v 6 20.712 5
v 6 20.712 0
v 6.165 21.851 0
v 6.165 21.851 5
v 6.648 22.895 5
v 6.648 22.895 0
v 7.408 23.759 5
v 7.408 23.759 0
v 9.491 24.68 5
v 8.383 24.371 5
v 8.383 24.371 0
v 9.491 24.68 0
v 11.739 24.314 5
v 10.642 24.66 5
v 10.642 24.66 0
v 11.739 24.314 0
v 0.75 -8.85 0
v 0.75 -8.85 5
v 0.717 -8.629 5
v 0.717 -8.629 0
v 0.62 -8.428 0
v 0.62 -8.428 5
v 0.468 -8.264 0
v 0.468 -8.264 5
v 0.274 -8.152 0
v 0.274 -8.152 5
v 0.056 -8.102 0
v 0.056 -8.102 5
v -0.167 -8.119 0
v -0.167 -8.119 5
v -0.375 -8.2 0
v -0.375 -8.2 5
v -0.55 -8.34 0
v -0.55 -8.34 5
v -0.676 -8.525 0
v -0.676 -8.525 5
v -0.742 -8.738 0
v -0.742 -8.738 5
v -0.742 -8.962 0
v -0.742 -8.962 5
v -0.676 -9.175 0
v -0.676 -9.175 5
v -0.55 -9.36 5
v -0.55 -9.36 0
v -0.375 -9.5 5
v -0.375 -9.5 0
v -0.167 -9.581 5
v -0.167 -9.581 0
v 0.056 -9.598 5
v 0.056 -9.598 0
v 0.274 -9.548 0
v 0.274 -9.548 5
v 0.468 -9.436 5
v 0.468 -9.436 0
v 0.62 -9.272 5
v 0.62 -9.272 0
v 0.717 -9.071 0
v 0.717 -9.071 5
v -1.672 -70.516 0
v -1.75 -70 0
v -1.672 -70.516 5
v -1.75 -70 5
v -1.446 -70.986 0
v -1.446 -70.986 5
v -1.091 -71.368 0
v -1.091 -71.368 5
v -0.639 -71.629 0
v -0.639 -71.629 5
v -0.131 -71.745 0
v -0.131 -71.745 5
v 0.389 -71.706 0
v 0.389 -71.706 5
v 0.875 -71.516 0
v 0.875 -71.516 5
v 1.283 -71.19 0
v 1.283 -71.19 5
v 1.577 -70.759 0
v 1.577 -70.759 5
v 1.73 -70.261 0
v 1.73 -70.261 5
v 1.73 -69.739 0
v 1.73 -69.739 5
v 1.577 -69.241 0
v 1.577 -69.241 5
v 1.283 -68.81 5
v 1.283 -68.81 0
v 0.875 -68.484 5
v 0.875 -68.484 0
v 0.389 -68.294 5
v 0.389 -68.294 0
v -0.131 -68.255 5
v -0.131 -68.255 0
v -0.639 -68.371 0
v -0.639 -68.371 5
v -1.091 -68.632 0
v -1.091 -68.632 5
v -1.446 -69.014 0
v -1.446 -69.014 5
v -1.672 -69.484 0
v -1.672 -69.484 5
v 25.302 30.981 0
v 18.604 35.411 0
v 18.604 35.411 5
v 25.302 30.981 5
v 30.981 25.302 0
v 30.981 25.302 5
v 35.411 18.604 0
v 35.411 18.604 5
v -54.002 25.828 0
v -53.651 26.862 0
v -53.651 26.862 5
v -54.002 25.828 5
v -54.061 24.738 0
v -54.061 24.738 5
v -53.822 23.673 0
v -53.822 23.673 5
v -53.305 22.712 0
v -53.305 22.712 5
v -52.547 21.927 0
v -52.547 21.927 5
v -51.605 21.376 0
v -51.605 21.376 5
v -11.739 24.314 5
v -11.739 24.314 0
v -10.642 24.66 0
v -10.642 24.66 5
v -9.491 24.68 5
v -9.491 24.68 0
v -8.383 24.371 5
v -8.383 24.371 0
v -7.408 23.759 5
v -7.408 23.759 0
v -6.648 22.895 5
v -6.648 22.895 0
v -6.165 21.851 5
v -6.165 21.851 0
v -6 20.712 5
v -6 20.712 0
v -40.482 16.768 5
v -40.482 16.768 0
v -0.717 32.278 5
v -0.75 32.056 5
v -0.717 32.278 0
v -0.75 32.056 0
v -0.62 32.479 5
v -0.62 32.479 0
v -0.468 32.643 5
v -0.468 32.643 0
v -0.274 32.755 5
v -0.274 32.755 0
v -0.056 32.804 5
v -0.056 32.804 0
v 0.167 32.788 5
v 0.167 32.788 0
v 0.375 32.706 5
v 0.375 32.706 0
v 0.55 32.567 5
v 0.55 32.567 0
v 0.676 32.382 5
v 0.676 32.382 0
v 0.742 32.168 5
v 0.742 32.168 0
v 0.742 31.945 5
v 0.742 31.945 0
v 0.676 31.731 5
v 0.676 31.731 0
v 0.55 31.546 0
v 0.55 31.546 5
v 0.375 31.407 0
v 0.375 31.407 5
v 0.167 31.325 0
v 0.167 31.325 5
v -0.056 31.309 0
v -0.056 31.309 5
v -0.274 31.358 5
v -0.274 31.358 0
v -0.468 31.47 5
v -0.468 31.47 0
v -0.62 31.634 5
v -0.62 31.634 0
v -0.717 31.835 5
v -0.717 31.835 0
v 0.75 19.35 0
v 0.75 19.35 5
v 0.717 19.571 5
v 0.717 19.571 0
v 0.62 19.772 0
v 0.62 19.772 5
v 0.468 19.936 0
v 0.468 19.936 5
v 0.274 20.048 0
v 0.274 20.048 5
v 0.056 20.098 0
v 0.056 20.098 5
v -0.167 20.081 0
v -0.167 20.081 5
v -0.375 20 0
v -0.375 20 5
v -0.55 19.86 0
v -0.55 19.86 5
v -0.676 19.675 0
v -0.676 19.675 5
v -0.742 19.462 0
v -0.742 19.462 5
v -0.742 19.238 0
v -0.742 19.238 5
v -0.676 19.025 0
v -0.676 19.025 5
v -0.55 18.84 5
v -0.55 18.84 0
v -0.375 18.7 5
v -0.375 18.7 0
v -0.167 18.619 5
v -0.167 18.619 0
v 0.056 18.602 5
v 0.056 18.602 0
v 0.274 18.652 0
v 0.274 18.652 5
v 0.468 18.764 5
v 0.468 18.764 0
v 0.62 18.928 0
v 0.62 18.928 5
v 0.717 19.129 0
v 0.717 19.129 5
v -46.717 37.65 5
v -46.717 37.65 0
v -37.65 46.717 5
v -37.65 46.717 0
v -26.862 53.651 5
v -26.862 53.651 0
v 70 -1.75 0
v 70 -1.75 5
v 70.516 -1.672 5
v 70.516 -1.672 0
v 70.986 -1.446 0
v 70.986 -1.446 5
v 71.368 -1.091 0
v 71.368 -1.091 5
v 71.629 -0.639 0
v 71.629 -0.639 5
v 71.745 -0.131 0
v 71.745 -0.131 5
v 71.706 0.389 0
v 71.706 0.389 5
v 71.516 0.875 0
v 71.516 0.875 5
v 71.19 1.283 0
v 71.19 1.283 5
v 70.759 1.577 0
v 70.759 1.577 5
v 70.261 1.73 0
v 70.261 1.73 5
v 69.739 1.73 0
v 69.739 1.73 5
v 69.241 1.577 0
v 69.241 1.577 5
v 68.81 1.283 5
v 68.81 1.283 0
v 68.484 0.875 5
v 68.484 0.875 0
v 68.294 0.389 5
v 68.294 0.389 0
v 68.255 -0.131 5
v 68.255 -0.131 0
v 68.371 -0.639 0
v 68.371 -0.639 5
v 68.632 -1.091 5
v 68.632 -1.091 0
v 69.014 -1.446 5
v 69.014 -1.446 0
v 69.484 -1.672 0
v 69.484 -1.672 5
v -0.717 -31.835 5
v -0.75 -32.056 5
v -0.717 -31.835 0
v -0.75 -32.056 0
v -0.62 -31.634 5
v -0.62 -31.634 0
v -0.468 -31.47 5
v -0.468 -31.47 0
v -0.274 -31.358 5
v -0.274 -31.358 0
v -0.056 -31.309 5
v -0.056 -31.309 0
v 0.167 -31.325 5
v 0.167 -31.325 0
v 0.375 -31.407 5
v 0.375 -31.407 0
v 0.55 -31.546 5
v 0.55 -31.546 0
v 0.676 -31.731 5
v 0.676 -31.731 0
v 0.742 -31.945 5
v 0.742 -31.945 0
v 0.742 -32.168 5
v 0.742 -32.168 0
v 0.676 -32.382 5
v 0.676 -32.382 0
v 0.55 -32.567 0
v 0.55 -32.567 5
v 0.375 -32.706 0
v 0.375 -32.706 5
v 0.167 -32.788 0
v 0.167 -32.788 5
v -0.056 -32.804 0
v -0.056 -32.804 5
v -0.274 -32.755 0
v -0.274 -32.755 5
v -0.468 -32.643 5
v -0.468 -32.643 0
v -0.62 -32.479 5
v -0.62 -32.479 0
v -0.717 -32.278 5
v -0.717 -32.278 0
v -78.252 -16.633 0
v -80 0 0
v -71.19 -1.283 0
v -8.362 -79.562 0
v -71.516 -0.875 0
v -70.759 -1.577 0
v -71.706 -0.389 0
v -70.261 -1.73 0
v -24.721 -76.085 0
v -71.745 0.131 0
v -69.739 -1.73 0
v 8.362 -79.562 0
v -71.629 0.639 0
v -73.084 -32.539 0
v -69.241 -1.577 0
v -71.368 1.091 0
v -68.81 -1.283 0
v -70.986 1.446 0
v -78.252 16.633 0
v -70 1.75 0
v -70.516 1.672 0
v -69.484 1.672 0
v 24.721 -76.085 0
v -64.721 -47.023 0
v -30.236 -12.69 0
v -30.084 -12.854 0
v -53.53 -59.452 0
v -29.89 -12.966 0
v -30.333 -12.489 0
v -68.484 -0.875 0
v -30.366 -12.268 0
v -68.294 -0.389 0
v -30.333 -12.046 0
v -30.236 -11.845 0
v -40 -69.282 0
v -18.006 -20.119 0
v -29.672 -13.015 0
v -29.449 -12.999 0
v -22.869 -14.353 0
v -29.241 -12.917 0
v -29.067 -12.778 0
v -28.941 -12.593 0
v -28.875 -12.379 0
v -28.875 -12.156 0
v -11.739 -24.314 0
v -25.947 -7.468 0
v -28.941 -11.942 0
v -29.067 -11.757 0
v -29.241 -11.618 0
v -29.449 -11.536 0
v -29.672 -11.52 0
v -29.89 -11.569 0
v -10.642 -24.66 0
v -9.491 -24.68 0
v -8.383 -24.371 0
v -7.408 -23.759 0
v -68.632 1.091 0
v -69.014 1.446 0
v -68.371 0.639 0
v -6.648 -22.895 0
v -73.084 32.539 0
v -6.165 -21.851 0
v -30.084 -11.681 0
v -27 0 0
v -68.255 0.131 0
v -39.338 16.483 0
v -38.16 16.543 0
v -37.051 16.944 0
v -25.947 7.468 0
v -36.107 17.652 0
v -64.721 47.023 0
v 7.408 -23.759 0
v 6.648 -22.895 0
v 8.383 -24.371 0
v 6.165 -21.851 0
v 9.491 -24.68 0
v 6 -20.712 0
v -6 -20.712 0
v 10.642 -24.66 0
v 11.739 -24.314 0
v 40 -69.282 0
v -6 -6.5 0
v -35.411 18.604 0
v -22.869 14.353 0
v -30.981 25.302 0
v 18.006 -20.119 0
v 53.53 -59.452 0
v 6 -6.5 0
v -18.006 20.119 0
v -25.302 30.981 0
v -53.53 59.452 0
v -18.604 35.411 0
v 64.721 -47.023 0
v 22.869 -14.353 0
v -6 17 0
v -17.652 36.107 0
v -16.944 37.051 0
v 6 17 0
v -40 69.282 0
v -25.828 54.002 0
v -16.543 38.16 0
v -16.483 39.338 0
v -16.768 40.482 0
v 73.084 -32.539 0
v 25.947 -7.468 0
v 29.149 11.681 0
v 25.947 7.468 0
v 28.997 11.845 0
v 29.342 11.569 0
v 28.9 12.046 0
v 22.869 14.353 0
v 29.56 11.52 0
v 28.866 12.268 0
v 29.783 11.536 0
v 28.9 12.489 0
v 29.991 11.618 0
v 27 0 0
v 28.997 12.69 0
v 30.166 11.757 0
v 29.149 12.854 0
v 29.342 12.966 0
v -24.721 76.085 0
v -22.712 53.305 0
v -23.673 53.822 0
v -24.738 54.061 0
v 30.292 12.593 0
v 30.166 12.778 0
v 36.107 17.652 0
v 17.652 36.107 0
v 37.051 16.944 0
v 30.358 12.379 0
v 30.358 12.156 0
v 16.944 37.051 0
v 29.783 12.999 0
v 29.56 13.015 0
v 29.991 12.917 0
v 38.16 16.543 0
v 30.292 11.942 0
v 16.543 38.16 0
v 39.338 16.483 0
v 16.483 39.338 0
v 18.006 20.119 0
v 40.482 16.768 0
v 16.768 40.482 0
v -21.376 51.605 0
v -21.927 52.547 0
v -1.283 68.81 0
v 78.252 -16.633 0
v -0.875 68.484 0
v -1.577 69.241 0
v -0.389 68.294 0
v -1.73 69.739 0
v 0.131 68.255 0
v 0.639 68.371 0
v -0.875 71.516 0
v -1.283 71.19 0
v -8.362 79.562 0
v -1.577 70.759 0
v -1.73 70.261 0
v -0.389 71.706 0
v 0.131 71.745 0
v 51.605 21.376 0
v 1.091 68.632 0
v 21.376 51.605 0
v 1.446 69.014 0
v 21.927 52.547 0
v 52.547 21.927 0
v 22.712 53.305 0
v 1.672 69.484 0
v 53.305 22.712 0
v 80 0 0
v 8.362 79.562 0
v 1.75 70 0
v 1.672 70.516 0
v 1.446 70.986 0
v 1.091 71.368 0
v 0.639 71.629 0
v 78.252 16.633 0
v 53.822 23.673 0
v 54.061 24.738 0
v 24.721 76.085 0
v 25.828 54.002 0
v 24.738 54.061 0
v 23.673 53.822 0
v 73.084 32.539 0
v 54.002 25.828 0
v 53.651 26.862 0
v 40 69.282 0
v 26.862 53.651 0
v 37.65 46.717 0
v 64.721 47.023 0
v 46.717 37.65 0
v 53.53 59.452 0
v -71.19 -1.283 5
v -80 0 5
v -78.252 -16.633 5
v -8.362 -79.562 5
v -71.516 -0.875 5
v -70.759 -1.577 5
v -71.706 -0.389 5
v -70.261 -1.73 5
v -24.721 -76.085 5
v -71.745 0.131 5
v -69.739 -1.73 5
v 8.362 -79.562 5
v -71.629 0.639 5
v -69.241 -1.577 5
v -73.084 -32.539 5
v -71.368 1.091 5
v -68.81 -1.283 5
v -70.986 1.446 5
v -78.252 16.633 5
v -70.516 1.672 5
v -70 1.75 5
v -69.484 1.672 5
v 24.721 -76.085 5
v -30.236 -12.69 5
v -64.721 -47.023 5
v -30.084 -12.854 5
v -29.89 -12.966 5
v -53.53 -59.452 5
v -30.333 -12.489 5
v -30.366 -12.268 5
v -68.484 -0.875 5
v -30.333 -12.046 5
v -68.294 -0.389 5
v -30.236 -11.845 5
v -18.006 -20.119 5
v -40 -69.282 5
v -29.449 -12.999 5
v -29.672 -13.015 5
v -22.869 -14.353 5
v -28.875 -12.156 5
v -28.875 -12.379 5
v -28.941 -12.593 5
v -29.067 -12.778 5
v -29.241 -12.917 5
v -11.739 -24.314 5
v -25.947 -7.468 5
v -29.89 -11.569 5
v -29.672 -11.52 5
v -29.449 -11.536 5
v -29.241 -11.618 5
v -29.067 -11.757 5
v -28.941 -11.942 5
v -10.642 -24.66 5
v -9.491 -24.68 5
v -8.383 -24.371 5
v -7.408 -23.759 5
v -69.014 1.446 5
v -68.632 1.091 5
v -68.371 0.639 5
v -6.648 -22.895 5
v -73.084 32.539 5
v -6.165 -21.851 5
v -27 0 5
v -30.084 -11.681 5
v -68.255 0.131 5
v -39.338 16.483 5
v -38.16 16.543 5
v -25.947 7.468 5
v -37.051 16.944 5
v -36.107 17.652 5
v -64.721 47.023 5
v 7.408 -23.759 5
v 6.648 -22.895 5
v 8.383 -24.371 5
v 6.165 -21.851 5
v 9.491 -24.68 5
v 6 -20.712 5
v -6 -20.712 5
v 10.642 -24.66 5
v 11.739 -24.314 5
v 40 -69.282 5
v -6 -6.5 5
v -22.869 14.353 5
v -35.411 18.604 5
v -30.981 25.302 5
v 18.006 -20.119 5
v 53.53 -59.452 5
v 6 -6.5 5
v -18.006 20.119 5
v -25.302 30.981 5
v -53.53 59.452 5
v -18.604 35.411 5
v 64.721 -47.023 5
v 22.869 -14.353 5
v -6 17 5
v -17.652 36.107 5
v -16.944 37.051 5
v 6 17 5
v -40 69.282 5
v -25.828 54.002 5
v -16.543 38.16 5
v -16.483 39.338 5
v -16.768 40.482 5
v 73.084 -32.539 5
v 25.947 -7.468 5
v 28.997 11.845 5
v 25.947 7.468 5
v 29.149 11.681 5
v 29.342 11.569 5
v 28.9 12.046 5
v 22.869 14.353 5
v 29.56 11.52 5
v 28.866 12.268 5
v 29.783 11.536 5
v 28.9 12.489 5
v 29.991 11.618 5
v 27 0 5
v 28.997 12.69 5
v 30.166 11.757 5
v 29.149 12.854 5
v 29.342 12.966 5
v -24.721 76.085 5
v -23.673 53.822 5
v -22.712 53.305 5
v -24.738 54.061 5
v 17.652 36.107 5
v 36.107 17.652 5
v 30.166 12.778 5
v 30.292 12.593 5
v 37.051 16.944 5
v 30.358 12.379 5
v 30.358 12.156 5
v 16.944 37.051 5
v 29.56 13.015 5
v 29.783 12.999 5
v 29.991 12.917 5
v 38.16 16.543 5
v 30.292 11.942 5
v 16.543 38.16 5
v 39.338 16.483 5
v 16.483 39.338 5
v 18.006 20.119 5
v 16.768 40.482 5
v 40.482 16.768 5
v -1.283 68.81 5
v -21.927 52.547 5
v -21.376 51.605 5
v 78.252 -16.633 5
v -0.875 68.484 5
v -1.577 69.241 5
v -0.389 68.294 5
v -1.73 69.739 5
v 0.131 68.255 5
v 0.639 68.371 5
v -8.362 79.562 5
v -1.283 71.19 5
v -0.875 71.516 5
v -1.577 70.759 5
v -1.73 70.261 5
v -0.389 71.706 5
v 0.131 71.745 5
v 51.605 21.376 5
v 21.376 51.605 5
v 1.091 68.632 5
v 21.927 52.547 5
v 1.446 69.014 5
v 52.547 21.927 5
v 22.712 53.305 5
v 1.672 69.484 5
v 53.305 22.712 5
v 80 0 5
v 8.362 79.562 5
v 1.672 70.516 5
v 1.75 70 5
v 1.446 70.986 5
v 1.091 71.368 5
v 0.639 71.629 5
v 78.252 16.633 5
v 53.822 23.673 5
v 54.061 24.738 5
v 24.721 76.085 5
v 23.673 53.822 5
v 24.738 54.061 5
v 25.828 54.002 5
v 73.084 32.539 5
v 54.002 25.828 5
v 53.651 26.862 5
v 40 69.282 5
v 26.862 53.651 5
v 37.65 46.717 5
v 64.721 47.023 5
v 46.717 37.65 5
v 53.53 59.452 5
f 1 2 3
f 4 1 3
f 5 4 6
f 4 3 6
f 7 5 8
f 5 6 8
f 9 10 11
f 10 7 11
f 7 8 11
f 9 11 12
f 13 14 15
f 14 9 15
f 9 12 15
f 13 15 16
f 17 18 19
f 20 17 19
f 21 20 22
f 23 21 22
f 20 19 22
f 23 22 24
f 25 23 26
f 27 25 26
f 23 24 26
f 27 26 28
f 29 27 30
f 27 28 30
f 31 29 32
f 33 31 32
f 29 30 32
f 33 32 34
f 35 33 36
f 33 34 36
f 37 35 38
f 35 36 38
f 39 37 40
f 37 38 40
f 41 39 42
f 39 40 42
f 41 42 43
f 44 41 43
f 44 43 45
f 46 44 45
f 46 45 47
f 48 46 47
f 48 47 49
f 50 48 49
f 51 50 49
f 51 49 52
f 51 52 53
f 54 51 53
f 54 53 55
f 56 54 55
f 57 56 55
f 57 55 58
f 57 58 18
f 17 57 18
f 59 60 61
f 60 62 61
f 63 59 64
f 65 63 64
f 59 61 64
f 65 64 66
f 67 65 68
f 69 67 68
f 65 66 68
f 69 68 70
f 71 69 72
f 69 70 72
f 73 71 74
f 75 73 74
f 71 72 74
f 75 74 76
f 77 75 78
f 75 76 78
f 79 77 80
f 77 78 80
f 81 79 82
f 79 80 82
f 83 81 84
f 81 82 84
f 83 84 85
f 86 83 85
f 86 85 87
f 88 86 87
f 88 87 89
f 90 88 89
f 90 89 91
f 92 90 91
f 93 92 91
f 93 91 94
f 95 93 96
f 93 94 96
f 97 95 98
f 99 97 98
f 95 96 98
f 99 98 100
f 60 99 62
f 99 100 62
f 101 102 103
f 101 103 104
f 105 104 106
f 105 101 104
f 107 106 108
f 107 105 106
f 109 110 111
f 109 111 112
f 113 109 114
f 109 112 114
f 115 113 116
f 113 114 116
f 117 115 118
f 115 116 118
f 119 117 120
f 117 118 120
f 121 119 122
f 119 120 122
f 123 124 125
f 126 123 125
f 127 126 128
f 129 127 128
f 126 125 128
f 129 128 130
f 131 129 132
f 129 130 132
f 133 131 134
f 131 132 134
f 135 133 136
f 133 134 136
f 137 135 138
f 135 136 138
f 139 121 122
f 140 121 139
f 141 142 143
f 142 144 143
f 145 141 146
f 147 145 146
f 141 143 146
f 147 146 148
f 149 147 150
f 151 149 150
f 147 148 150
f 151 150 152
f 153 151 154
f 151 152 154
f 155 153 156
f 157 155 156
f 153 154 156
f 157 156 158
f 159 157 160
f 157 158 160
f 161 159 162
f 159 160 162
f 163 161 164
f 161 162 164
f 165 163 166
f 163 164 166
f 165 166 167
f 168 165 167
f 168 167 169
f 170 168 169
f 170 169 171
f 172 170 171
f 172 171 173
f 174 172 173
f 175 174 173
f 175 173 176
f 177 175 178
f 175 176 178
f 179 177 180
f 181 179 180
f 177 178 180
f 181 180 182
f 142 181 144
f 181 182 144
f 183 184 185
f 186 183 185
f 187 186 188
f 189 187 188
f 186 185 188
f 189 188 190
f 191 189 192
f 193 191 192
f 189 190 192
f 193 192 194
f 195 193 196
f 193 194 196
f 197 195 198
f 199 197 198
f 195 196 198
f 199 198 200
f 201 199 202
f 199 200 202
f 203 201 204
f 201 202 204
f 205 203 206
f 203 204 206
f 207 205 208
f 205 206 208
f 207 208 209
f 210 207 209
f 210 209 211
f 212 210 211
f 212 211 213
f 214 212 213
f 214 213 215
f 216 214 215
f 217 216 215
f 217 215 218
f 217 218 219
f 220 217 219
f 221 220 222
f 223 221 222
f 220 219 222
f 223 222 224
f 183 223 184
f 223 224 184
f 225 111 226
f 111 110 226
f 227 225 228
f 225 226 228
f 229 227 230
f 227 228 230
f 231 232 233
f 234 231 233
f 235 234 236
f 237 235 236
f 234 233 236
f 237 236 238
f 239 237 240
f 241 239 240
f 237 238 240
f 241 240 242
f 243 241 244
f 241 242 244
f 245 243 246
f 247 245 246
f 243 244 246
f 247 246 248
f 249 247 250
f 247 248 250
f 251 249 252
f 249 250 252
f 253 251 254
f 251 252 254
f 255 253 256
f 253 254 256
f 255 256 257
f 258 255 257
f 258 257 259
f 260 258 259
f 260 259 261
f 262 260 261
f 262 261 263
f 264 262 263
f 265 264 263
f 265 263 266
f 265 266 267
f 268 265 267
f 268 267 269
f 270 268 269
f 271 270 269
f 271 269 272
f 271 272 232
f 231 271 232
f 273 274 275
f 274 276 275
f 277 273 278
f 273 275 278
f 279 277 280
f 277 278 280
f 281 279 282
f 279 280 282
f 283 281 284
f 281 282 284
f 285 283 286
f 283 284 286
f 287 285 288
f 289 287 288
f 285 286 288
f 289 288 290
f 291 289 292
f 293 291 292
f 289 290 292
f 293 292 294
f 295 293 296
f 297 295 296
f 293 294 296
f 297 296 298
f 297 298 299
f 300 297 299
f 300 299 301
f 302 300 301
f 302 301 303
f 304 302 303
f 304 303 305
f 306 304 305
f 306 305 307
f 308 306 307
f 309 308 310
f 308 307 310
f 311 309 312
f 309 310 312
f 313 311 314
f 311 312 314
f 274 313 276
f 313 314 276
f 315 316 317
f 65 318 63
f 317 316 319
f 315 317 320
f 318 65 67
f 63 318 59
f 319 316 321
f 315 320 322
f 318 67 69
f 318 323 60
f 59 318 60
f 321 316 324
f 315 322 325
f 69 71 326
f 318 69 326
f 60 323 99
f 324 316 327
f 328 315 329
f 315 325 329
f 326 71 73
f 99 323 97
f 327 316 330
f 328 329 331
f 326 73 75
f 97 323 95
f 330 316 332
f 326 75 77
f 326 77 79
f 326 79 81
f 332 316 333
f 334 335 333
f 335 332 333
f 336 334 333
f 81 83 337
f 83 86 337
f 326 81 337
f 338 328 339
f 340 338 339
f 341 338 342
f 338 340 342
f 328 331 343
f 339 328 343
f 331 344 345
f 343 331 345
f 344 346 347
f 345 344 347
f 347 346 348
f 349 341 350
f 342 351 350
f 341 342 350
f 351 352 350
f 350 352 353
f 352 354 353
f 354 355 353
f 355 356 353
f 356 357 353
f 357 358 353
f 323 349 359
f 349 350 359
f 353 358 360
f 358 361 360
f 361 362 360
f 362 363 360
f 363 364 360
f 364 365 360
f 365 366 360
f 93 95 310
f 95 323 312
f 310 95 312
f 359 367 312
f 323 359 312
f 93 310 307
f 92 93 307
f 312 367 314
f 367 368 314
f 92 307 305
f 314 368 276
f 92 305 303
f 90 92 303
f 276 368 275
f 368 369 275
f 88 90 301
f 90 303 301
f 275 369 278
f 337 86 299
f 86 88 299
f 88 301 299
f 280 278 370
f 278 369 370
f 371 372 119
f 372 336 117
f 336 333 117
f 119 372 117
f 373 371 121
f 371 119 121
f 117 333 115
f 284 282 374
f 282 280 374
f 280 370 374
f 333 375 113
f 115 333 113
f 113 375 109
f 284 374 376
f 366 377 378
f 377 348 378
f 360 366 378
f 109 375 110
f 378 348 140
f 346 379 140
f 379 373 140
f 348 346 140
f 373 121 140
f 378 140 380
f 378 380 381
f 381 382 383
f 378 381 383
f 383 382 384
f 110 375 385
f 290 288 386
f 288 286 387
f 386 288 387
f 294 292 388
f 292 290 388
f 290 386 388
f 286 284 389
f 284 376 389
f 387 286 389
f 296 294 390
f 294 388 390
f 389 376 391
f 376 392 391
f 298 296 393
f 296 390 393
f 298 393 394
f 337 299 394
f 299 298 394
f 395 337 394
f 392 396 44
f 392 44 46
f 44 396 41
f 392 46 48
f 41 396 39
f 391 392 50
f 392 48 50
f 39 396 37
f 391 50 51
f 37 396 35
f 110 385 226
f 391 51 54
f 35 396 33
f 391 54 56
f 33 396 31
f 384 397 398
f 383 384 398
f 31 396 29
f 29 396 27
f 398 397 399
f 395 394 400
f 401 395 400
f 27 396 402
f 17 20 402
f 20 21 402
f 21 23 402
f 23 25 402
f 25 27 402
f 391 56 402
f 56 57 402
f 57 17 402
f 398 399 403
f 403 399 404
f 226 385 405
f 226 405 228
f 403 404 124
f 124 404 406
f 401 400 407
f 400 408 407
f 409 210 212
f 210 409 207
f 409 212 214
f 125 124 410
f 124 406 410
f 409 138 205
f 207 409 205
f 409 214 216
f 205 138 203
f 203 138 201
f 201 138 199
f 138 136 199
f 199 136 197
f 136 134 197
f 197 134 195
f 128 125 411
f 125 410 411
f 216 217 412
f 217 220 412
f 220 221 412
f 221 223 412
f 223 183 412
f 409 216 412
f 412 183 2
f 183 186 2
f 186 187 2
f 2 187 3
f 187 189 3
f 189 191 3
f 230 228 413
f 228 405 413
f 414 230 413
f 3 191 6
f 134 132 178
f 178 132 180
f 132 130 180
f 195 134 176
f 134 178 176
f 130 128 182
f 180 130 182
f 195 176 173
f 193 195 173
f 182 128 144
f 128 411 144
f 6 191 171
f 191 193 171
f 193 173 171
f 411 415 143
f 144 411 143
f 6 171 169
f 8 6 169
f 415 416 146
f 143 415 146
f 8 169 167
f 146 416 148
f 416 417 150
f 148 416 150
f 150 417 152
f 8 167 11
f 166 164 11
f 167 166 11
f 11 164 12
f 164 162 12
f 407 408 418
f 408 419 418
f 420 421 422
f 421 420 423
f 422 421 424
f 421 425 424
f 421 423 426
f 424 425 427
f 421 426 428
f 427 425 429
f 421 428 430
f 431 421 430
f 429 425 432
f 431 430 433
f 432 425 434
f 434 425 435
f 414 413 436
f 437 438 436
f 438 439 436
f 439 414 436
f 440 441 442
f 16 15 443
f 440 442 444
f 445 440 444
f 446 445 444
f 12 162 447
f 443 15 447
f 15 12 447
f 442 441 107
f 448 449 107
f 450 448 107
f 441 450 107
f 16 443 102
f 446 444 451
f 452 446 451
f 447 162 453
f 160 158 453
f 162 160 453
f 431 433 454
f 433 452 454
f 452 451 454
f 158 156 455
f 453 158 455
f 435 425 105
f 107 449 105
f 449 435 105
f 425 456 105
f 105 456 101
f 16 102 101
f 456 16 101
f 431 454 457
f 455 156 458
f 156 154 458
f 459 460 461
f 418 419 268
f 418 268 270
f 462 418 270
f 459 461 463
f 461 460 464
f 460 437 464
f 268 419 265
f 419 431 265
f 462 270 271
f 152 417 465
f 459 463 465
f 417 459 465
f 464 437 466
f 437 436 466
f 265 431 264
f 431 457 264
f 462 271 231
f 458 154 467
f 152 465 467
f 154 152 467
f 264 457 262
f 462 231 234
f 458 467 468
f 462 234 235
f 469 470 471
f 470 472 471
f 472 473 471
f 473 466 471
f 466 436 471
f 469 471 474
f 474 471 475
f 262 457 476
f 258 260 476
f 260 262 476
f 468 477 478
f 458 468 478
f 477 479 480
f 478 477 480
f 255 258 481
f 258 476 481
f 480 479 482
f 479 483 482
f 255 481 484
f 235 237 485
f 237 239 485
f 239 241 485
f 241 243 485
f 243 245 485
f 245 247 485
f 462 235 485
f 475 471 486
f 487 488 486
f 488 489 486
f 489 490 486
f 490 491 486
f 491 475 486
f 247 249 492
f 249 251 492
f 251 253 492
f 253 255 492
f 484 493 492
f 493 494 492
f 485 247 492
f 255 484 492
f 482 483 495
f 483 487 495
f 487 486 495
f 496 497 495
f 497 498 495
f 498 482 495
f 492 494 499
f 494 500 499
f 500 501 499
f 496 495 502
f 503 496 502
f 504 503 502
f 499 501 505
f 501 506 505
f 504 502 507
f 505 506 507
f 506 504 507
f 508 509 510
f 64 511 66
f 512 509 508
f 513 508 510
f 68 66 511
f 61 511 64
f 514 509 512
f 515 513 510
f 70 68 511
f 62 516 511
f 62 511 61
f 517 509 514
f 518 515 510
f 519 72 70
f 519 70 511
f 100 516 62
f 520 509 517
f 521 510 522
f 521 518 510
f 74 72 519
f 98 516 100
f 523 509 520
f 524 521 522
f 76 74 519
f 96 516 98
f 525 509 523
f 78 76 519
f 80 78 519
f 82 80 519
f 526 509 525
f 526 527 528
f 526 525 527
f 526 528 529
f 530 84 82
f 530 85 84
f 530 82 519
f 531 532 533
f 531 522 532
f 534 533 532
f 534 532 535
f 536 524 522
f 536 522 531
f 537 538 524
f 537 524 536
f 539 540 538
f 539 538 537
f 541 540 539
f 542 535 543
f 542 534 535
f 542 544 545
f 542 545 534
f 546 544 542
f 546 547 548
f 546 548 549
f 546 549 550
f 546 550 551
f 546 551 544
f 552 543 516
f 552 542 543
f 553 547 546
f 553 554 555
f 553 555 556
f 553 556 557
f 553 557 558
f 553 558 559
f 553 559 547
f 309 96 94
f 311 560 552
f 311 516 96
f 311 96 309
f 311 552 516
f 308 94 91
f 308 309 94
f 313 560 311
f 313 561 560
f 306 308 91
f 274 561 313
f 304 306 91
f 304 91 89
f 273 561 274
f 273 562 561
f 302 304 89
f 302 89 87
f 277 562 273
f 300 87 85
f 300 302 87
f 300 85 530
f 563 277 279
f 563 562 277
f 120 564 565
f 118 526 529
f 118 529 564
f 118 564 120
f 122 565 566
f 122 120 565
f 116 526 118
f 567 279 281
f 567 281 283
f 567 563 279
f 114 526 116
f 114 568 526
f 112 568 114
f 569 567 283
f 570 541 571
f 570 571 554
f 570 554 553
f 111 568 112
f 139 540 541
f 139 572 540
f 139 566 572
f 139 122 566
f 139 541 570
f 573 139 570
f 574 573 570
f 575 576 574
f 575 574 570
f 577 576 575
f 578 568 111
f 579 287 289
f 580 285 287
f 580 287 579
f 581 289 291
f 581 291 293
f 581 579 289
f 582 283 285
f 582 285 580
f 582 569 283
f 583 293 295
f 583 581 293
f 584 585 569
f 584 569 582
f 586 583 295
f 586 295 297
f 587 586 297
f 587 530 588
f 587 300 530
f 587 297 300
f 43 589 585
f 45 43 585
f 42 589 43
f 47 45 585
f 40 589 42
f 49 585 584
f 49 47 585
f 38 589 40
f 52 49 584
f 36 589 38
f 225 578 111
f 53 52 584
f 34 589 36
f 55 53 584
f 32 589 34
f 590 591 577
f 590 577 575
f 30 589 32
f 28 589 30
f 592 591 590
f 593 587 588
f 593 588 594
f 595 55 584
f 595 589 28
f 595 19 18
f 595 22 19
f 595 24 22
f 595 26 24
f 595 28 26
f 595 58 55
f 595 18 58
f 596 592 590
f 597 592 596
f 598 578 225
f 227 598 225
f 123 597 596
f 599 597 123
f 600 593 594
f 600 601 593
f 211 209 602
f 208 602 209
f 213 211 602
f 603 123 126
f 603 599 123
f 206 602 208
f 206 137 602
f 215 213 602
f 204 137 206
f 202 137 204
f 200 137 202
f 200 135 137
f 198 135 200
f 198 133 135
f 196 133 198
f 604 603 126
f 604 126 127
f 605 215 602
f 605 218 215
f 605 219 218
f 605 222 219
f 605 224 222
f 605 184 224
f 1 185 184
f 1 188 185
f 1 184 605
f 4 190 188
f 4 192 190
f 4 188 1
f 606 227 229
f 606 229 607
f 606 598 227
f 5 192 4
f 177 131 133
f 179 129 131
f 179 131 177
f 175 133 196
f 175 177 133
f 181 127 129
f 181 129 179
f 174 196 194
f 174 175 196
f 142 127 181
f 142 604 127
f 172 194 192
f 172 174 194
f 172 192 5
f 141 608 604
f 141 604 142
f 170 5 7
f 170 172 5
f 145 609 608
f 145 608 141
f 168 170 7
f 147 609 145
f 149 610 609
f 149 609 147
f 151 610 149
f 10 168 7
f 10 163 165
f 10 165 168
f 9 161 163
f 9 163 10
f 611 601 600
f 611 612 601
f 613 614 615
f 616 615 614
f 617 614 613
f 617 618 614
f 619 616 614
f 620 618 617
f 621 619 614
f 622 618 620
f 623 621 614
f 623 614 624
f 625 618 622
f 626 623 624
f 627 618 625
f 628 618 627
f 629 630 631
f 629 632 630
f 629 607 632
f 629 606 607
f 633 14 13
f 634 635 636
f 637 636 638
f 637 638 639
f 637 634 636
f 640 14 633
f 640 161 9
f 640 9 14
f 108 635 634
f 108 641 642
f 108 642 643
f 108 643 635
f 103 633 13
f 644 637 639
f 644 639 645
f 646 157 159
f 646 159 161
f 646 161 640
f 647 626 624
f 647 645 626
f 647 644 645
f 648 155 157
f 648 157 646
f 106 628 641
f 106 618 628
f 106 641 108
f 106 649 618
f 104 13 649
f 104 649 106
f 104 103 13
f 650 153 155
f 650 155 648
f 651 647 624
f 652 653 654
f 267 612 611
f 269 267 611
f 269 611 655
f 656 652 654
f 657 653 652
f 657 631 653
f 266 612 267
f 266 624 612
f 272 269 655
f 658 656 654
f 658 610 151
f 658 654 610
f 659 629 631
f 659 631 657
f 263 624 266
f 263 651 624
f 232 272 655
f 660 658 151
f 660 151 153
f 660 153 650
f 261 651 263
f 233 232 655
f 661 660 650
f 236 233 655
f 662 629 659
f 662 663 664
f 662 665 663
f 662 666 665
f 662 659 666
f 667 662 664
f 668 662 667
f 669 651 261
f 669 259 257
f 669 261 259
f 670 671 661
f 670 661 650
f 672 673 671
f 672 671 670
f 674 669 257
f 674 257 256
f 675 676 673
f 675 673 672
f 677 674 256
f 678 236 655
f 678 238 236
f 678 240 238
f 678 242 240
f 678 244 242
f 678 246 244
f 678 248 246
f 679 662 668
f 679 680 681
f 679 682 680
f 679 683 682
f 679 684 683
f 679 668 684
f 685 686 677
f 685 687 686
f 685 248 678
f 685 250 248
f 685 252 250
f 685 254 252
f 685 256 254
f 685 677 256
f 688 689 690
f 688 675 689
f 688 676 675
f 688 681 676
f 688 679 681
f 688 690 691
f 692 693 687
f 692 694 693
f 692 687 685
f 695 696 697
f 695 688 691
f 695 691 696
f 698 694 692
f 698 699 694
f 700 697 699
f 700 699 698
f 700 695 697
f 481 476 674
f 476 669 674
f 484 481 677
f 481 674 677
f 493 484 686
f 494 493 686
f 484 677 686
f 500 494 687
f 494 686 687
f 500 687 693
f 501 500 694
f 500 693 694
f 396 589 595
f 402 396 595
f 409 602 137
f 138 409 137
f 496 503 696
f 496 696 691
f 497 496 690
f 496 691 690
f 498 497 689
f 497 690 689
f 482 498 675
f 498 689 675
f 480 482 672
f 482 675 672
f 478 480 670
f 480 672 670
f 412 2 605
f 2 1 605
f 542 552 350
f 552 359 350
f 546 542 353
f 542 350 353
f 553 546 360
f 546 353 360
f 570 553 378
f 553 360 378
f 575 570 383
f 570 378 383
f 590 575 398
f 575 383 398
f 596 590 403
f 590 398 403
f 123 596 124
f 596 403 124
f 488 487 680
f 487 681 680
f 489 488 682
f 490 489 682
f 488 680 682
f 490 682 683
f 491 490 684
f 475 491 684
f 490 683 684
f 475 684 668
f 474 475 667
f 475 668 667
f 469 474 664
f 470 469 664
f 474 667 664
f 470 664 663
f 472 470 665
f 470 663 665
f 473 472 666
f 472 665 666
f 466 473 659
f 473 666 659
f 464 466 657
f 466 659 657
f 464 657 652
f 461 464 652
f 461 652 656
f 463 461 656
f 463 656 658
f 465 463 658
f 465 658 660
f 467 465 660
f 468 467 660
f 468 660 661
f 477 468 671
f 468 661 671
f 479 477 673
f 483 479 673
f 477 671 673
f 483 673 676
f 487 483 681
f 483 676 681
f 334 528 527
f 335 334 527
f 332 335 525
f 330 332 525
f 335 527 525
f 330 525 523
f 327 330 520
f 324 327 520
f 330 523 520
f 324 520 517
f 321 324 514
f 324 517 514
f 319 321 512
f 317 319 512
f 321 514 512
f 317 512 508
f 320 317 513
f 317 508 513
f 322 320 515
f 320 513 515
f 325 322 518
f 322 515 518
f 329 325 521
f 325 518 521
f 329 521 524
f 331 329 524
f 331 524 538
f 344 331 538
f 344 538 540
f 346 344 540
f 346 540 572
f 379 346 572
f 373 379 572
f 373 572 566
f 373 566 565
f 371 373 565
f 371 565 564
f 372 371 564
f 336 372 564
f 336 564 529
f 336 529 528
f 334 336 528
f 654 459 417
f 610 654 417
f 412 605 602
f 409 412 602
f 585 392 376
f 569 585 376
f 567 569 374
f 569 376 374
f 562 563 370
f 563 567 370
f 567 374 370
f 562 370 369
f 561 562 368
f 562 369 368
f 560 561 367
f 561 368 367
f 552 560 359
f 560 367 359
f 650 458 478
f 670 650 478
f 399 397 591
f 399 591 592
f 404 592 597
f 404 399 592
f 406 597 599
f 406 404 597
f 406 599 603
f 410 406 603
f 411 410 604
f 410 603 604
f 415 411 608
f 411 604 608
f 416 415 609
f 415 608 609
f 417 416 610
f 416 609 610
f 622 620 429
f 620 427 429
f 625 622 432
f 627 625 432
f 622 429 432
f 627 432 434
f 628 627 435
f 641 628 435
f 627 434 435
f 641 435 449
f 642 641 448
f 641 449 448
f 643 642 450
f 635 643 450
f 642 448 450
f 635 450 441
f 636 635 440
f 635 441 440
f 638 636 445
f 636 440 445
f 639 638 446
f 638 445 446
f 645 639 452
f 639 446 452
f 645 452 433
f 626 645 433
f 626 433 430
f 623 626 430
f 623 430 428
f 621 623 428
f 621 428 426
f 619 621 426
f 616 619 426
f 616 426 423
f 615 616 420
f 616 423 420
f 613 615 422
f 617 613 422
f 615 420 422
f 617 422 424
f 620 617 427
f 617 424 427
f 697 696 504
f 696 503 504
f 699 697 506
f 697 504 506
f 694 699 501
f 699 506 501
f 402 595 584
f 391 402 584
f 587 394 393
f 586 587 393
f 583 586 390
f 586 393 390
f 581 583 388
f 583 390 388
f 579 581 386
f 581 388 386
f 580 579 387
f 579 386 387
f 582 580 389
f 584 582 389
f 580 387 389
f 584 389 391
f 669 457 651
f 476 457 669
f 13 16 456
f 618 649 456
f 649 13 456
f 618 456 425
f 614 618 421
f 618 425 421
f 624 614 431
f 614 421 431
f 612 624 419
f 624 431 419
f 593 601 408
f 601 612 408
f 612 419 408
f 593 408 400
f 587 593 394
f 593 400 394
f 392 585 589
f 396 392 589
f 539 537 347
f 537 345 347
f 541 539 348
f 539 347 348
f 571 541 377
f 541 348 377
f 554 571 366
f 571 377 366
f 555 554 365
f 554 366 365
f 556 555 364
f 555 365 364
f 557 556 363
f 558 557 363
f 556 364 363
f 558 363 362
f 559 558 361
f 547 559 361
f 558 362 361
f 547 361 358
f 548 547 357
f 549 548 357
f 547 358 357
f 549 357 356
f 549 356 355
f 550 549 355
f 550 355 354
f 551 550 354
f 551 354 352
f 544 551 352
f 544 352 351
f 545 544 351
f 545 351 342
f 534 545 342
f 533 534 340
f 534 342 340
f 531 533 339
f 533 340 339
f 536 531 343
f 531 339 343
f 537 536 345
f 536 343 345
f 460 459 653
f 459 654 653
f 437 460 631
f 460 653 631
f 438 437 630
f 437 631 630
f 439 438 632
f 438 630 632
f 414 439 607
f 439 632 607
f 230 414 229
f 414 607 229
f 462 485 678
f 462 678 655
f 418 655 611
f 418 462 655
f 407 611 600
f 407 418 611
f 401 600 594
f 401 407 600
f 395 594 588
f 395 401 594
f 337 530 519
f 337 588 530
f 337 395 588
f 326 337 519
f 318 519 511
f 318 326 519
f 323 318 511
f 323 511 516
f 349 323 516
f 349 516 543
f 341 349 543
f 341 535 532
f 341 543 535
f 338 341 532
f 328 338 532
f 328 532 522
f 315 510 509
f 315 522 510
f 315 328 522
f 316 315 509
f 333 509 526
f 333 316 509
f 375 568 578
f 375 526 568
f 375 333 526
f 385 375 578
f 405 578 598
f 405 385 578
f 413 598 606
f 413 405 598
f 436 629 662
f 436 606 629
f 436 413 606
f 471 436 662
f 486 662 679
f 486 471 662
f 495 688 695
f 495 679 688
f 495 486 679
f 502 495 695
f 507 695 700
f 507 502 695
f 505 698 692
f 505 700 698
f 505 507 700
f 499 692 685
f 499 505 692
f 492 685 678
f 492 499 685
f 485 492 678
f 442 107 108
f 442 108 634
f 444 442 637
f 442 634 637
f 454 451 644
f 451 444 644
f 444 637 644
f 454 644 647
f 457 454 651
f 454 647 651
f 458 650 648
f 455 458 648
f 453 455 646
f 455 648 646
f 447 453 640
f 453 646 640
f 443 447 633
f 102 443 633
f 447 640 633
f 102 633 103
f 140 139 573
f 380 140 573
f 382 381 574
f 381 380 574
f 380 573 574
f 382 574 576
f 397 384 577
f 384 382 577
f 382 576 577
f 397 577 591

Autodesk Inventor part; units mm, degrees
ref_plane "YZ Plane" through (0, 0, 0) normal (1, 0, 0) x (0, 1, 0)
ref_plane "XZ Plane" through (0, 0, 0) normal (0, 1, 0) x (-1, 0, 0)
ref_plane "XY Plane" through (0, 0, 0) normal (0, 0, 1) x (1, 0, 0)
sketch "스케치1" plane through (0, 0, 0) normal (0, 0, 1) x (1, 0, 0)
  circle A0 centre (0, 0) radius 80
  circle A1 centre (0, 0) radius 34 construction
  circle A2 centre (0, 0) radius 27
  circle A3 centre (0, 0) radius 60
  circle A4 centre (0, 0) radius 40
  line L0 (0, 0) -> (22.961, 55.4328)
  line L1 (0, 0) -> (55.4328, 22.961)
  line L2 (0, 0) -> (0, 60) construction
  point P0 (15.3073, 36.9552)
  point P1 (36.9552, 15.3073)
  dimension "d0" = 160
  dimension "d1" = 68
  dimension "d2" = 54
  dimension "d3" = 120
  dimension "d4" = 80
  dimension "d5" = 45
  dimension "d45" = 22.5
extrude "돌출1" add sketch "스케치1" along normal blind 5 contours A0 | A2 L1 A4 L0 | A2 L0 A4 L1 | L1 A3 L0 A4 | A4 L0 A3 L1
extrude "돌출2" cut sketch "스케치1" along normal blind 5 contours A4 L0 A3 L1 picked at (23.2061, 47.8488)
fillet "모깎기1" radius 4 4 edges at (22.961, 55.4328, 2.5) (15.3073, 36.9552, 2.5) (36.9552, 15.3073, 2.5) (55.4328, 22.961, 2.5)
sketch "스케치2" plane through (0, 0, 5) normal (0, 0, 1) x (1, 0, 0)
  circle A0 centre (0, 70) radius 1.75
  point P0 (0, 0)
  dimension "d14" = 3.5
  dimension "d15" = 70
extrude "돌출3" cut sketch "스케치2" against normal blind 5
pattern_circular "원형 패턴2" count 4 over 360 about axis through (0, 0, 0) along (0, 0, 1) of "돌출3"
sketch "스케치3" plane through (0, 0, 5) normal (0, 0, 1) x (1, 0, 0)
  circle A0 centre (0, 0) radius 6 construction
  line L0 (-6, 16.5) -> (6, 16.5) construction
  line L1 (6, 16.5) -> (6, -6) construction
  line L2 (6, -6) -> (-6, -6) construction
  line L3 (-6, -6) -> (-6, 16.5) construction
  line L4 (-6, 21.35) -> (6, 21.35) construction
  line L5 (6, 21.35) -> (6, -10.85) construction
  line L6 (6, -10.85) -> (-6, -10.85) construction
  line L7 (-6, -10.85) -> (-6, 21.35) construction
  circle A1 centre (0, 19.35) radius 0.75
  line L8 (-6, 5.25) -> (-8.8851, 5.25) construction
  circle A2 centre (0, -8.85) radius 0.75
  line L9 (-6, 27) -> (6, 27)
  line L10 (6, 27) -> (6, 17)
  line L11 (6, 17) -> (-6, 17)
  line L12 (-6, 17) -> (-6, 27)
  line L13 (-6, -6.5) -> (6, -6.5)
  line L14 (6, -6.5) -> (6, -27)
  line L15 (6, -27) -> (-6, -27)
  line L16 (-6, -27) -> (-6, -6.5)
  circle A3 centre (0, 0) radius 27 projected
  point P0 (0, -6)
  point P1 (0, 27)
  point P2 (0, -27)
  point P3 (-6, -26.3249)
  point P4 (6, -26.3249)
  point P5 (6, 26.3249)
  point P6 (-6, 26.3249)
  dimension "d21" = 12
  dimension "d22" = 12
  dimension "d23" = 22.5
  dimension "d24" = 32.2
  dimension "d26" = 1.5
  dimension "d27" = 28.2
  dimension "d28" = 0.5
  dimension "d29" = 0.5
  dimension "d30" = 12
  dimension "d31" = 12
extrude "돌출4" add sketch "스케치3" against normal blind 5 contours A3 L10 L11 L12 | L16 L13 L14 A3
fillet "모깎기2" radius 4 4 edges at (-6, 26.3249, 2.5) (6, 26.3249, 2.5) (-6, -26.3249, 2.5) (6, -26.3249, 2.5)
sketch "스케치4" plane through (0, 0, 0) normal (0, 0, -1) x (-1, 0, 0)
  circle A0 centre (0, 0) radius 32.0565 construction
  circle A1 centre (0, -32.0565) radius 0.75
  line L0 (0, -32.0565) -> (0, 0)
  line L1 (0, 0) -> (29.6163, -12.2675)
  circle A2 centre (29.6163, -12.2675) radius 0.75
  circle A3 centre (0, 32.0565) radius 0.75
  circle A4 centre (-29.6163, 12.2675) radius 0.75
  dimension "d35" = 64.113
  dimension "d36" = 1.5
  dimension "d37" = 1.5
  dimension "d38" = 67.5
  dimension "d41" = 360
extrude "돌출5" cut sketch "스케치4" against normal blind 5
mirror "미러1" about plane through (0, 0, 0) normal (1, 0, 0) of "돌출2", "모깎기1"
properties part number "아크릴 LED확산판"
